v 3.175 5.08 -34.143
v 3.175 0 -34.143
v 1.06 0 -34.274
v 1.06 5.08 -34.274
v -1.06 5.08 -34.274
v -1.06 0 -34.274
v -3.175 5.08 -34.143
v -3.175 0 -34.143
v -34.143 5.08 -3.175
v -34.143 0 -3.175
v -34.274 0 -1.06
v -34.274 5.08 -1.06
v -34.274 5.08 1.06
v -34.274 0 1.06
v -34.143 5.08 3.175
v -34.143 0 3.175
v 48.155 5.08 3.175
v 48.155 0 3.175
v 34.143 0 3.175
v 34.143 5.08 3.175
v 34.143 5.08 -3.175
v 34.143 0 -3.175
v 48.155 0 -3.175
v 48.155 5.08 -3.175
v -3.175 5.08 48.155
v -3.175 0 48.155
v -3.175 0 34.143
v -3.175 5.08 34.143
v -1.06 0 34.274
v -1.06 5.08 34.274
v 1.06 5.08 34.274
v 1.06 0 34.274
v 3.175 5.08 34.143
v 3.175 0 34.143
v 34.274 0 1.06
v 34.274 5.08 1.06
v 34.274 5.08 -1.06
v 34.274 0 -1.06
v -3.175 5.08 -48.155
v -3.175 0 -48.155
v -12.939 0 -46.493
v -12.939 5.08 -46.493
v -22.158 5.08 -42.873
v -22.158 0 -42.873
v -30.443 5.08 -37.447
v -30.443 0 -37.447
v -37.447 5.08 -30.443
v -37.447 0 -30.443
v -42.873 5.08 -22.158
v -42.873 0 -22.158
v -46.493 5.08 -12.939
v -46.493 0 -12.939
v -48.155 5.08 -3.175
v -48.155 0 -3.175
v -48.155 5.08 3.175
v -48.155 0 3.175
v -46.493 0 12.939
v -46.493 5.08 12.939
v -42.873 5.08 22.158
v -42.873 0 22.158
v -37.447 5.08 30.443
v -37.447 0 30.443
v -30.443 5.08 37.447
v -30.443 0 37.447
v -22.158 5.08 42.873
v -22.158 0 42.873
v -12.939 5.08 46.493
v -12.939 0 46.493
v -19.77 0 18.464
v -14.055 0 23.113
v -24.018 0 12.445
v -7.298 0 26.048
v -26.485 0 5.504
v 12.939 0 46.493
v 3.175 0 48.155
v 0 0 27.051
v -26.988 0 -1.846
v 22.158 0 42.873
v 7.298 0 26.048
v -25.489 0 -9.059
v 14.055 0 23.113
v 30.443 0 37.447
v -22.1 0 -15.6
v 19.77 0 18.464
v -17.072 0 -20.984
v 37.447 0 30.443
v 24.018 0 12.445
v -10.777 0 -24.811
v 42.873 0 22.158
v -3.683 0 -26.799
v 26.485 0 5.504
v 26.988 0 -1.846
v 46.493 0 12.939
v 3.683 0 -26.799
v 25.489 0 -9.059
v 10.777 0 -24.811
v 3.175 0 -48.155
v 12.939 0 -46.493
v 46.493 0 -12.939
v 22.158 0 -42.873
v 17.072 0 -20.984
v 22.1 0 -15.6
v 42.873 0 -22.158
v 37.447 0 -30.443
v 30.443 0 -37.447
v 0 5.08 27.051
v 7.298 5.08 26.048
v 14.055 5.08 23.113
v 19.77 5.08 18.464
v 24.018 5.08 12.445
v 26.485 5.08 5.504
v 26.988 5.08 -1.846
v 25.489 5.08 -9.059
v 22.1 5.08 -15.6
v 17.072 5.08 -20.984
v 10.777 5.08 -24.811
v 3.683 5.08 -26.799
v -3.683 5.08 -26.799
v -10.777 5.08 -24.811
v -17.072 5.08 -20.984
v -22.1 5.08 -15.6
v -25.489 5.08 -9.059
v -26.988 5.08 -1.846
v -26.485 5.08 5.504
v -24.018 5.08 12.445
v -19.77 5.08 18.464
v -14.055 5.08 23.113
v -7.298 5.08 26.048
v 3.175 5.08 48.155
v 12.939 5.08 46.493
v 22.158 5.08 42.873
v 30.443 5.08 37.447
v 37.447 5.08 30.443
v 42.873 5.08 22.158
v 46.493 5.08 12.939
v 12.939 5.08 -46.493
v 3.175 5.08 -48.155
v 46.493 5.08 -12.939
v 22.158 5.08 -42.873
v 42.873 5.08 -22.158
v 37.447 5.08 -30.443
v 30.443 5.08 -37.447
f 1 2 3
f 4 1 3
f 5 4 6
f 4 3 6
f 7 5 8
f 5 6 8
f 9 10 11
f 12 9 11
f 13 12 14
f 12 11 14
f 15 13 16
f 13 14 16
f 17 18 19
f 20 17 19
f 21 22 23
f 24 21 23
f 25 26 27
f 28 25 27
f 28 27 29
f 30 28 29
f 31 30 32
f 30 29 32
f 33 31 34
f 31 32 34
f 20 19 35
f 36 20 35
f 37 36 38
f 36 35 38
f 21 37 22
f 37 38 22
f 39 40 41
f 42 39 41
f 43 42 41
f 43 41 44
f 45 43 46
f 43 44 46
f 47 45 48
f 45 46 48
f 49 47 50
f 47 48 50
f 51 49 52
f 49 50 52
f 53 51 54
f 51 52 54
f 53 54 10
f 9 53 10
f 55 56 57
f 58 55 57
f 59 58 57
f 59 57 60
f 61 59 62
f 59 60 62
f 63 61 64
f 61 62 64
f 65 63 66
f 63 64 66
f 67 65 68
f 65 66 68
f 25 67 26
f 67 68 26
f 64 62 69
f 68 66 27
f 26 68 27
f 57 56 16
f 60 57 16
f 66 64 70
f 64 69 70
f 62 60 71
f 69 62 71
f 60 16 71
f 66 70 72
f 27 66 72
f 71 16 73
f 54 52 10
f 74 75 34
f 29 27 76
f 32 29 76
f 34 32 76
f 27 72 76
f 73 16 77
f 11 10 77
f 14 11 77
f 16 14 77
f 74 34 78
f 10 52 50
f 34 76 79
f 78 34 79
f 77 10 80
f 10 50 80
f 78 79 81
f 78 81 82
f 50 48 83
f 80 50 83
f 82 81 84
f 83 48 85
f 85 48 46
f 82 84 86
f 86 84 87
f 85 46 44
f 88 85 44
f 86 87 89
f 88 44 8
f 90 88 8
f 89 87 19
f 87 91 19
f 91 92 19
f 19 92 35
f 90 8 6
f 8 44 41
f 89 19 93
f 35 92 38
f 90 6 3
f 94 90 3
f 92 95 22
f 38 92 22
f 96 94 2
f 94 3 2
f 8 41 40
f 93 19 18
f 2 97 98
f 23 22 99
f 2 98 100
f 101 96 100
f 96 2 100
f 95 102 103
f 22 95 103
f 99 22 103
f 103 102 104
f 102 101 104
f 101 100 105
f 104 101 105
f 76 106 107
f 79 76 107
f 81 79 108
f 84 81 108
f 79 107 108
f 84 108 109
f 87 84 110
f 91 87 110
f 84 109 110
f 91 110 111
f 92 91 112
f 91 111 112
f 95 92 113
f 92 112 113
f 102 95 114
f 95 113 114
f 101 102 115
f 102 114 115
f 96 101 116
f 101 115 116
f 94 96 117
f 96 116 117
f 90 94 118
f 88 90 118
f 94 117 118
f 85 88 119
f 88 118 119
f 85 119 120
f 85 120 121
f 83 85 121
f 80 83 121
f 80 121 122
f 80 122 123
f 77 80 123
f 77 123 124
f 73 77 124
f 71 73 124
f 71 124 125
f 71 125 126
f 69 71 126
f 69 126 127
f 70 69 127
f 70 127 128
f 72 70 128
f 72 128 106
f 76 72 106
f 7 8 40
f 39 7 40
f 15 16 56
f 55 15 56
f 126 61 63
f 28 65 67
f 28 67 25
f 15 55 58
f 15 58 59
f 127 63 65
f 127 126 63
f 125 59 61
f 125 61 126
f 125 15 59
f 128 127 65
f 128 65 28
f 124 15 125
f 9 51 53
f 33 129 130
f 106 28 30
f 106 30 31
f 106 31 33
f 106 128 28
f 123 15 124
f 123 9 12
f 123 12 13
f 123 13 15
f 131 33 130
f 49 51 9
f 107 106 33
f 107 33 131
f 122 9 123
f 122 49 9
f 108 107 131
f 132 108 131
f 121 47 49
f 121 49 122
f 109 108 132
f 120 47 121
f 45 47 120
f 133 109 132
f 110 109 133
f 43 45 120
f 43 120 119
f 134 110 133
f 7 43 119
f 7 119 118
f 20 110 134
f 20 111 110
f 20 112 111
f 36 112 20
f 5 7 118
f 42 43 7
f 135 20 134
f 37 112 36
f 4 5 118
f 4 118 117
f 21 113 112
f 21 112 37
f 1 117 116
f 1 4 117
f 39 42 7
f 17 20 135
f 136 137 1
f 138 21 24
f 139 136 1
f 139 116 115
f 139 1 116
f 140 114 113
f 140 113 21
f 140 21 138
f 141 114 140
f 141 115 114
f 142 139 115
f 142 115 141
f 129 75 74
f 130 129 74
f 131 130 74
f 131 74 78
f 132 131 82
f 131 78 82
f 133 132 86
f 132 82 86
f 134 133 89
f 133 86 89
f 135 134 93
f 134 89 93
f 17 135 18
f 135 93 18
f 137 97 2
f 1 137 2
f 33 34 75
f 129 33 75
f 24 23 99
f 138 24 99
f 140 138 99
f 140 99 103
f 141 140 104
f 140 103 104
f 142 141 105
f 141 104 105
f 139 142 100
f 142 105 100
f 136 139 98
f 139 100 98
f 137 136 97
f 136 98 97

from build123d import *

# Parameters (mm, degrees)
BOSS_EXTRUDE1_DEPTH = 5.08
SKETCH2_R           = 27.051
CUT_EXTRUDE1_DEPTH  = 69.29129044


with BuildPart() as part:
    # Sketch1 → Boss-Extrude1 (new body)
    with BuildSketch(Plane(origin=(0, 0, 0), x_dir=(1, 0, 0), z_dir=(0, 1, 0))):
        with BuildLine():
            ThreePointArc((34.142692849, -3.175), (34.29, 0), (34.142692849, 3.175))
            Line((34.142692849, 3.175), (48.155445954, 3.175))
            ThreePointArc((48.155445954, 3.175), (34.12497326, 34.12497326), (3.175, 48.155445954))
            Line((3.175, 48.155445954), (3.175, 34.142692849))
            ThreePointArc((3.175, 34.142692849), (0, 34.29), (-3.175, 34.142692849))
            Line((-3.175, 34.142692849), (-3.175, 48.155445954))
            ThreePointArc((-3.175, 48.155445954), (-34.12497326, 34.12497326), (-48.155445954, 3.175))
            Line((-48.155445954, 3.175), (-34.142692849, 3.175))
            ThreePointArc((-34.142692849, 3.175), (-34.29, 0), (-34.142692849, -3.175))
            Line((-34.142692849, -3.175), (-48.155445954, -3.175))
            ThreePointArc((-48.155445954, -3.175), (-34.12497326, -34.12497326), (-3.175, -48.155445954))
            Line((-3.175, -48.155445954), (-3.175, -34.142692849))
            ThreePointArc((-3.175, -34.142692849), (0, -34.29), (3.175, -34.142692849))
            Line((3.175, -34.142692849), (3.175, -48.155445954))
            ThreePointArc((3.175, -48.155445954), (34.12497326, -34.12497326), (48.155445954, -3.175))
            Line((48.155445954, -3.175), (34.142692849, -3.175))
        make_face()
    extrude(amount=BOSS_EXTRUDE1_DEPTH)

    # Sketch2 → Cut-Extrude1 (cut, through all)
    with BuildSketch(Plane(origin=(0, 5.08, 0), x_dir=(1, 0, 0), z_dir=(0, 1, 0))):
        with Locations(Location((0, 0, 0), (0, 0, 270))):
            Circle(SKETCH2_R)
    extrude(amount=-CUT_EXTRUDE1_DEPTH, mode=Mode.SUBTRACT)


solid = part.part
